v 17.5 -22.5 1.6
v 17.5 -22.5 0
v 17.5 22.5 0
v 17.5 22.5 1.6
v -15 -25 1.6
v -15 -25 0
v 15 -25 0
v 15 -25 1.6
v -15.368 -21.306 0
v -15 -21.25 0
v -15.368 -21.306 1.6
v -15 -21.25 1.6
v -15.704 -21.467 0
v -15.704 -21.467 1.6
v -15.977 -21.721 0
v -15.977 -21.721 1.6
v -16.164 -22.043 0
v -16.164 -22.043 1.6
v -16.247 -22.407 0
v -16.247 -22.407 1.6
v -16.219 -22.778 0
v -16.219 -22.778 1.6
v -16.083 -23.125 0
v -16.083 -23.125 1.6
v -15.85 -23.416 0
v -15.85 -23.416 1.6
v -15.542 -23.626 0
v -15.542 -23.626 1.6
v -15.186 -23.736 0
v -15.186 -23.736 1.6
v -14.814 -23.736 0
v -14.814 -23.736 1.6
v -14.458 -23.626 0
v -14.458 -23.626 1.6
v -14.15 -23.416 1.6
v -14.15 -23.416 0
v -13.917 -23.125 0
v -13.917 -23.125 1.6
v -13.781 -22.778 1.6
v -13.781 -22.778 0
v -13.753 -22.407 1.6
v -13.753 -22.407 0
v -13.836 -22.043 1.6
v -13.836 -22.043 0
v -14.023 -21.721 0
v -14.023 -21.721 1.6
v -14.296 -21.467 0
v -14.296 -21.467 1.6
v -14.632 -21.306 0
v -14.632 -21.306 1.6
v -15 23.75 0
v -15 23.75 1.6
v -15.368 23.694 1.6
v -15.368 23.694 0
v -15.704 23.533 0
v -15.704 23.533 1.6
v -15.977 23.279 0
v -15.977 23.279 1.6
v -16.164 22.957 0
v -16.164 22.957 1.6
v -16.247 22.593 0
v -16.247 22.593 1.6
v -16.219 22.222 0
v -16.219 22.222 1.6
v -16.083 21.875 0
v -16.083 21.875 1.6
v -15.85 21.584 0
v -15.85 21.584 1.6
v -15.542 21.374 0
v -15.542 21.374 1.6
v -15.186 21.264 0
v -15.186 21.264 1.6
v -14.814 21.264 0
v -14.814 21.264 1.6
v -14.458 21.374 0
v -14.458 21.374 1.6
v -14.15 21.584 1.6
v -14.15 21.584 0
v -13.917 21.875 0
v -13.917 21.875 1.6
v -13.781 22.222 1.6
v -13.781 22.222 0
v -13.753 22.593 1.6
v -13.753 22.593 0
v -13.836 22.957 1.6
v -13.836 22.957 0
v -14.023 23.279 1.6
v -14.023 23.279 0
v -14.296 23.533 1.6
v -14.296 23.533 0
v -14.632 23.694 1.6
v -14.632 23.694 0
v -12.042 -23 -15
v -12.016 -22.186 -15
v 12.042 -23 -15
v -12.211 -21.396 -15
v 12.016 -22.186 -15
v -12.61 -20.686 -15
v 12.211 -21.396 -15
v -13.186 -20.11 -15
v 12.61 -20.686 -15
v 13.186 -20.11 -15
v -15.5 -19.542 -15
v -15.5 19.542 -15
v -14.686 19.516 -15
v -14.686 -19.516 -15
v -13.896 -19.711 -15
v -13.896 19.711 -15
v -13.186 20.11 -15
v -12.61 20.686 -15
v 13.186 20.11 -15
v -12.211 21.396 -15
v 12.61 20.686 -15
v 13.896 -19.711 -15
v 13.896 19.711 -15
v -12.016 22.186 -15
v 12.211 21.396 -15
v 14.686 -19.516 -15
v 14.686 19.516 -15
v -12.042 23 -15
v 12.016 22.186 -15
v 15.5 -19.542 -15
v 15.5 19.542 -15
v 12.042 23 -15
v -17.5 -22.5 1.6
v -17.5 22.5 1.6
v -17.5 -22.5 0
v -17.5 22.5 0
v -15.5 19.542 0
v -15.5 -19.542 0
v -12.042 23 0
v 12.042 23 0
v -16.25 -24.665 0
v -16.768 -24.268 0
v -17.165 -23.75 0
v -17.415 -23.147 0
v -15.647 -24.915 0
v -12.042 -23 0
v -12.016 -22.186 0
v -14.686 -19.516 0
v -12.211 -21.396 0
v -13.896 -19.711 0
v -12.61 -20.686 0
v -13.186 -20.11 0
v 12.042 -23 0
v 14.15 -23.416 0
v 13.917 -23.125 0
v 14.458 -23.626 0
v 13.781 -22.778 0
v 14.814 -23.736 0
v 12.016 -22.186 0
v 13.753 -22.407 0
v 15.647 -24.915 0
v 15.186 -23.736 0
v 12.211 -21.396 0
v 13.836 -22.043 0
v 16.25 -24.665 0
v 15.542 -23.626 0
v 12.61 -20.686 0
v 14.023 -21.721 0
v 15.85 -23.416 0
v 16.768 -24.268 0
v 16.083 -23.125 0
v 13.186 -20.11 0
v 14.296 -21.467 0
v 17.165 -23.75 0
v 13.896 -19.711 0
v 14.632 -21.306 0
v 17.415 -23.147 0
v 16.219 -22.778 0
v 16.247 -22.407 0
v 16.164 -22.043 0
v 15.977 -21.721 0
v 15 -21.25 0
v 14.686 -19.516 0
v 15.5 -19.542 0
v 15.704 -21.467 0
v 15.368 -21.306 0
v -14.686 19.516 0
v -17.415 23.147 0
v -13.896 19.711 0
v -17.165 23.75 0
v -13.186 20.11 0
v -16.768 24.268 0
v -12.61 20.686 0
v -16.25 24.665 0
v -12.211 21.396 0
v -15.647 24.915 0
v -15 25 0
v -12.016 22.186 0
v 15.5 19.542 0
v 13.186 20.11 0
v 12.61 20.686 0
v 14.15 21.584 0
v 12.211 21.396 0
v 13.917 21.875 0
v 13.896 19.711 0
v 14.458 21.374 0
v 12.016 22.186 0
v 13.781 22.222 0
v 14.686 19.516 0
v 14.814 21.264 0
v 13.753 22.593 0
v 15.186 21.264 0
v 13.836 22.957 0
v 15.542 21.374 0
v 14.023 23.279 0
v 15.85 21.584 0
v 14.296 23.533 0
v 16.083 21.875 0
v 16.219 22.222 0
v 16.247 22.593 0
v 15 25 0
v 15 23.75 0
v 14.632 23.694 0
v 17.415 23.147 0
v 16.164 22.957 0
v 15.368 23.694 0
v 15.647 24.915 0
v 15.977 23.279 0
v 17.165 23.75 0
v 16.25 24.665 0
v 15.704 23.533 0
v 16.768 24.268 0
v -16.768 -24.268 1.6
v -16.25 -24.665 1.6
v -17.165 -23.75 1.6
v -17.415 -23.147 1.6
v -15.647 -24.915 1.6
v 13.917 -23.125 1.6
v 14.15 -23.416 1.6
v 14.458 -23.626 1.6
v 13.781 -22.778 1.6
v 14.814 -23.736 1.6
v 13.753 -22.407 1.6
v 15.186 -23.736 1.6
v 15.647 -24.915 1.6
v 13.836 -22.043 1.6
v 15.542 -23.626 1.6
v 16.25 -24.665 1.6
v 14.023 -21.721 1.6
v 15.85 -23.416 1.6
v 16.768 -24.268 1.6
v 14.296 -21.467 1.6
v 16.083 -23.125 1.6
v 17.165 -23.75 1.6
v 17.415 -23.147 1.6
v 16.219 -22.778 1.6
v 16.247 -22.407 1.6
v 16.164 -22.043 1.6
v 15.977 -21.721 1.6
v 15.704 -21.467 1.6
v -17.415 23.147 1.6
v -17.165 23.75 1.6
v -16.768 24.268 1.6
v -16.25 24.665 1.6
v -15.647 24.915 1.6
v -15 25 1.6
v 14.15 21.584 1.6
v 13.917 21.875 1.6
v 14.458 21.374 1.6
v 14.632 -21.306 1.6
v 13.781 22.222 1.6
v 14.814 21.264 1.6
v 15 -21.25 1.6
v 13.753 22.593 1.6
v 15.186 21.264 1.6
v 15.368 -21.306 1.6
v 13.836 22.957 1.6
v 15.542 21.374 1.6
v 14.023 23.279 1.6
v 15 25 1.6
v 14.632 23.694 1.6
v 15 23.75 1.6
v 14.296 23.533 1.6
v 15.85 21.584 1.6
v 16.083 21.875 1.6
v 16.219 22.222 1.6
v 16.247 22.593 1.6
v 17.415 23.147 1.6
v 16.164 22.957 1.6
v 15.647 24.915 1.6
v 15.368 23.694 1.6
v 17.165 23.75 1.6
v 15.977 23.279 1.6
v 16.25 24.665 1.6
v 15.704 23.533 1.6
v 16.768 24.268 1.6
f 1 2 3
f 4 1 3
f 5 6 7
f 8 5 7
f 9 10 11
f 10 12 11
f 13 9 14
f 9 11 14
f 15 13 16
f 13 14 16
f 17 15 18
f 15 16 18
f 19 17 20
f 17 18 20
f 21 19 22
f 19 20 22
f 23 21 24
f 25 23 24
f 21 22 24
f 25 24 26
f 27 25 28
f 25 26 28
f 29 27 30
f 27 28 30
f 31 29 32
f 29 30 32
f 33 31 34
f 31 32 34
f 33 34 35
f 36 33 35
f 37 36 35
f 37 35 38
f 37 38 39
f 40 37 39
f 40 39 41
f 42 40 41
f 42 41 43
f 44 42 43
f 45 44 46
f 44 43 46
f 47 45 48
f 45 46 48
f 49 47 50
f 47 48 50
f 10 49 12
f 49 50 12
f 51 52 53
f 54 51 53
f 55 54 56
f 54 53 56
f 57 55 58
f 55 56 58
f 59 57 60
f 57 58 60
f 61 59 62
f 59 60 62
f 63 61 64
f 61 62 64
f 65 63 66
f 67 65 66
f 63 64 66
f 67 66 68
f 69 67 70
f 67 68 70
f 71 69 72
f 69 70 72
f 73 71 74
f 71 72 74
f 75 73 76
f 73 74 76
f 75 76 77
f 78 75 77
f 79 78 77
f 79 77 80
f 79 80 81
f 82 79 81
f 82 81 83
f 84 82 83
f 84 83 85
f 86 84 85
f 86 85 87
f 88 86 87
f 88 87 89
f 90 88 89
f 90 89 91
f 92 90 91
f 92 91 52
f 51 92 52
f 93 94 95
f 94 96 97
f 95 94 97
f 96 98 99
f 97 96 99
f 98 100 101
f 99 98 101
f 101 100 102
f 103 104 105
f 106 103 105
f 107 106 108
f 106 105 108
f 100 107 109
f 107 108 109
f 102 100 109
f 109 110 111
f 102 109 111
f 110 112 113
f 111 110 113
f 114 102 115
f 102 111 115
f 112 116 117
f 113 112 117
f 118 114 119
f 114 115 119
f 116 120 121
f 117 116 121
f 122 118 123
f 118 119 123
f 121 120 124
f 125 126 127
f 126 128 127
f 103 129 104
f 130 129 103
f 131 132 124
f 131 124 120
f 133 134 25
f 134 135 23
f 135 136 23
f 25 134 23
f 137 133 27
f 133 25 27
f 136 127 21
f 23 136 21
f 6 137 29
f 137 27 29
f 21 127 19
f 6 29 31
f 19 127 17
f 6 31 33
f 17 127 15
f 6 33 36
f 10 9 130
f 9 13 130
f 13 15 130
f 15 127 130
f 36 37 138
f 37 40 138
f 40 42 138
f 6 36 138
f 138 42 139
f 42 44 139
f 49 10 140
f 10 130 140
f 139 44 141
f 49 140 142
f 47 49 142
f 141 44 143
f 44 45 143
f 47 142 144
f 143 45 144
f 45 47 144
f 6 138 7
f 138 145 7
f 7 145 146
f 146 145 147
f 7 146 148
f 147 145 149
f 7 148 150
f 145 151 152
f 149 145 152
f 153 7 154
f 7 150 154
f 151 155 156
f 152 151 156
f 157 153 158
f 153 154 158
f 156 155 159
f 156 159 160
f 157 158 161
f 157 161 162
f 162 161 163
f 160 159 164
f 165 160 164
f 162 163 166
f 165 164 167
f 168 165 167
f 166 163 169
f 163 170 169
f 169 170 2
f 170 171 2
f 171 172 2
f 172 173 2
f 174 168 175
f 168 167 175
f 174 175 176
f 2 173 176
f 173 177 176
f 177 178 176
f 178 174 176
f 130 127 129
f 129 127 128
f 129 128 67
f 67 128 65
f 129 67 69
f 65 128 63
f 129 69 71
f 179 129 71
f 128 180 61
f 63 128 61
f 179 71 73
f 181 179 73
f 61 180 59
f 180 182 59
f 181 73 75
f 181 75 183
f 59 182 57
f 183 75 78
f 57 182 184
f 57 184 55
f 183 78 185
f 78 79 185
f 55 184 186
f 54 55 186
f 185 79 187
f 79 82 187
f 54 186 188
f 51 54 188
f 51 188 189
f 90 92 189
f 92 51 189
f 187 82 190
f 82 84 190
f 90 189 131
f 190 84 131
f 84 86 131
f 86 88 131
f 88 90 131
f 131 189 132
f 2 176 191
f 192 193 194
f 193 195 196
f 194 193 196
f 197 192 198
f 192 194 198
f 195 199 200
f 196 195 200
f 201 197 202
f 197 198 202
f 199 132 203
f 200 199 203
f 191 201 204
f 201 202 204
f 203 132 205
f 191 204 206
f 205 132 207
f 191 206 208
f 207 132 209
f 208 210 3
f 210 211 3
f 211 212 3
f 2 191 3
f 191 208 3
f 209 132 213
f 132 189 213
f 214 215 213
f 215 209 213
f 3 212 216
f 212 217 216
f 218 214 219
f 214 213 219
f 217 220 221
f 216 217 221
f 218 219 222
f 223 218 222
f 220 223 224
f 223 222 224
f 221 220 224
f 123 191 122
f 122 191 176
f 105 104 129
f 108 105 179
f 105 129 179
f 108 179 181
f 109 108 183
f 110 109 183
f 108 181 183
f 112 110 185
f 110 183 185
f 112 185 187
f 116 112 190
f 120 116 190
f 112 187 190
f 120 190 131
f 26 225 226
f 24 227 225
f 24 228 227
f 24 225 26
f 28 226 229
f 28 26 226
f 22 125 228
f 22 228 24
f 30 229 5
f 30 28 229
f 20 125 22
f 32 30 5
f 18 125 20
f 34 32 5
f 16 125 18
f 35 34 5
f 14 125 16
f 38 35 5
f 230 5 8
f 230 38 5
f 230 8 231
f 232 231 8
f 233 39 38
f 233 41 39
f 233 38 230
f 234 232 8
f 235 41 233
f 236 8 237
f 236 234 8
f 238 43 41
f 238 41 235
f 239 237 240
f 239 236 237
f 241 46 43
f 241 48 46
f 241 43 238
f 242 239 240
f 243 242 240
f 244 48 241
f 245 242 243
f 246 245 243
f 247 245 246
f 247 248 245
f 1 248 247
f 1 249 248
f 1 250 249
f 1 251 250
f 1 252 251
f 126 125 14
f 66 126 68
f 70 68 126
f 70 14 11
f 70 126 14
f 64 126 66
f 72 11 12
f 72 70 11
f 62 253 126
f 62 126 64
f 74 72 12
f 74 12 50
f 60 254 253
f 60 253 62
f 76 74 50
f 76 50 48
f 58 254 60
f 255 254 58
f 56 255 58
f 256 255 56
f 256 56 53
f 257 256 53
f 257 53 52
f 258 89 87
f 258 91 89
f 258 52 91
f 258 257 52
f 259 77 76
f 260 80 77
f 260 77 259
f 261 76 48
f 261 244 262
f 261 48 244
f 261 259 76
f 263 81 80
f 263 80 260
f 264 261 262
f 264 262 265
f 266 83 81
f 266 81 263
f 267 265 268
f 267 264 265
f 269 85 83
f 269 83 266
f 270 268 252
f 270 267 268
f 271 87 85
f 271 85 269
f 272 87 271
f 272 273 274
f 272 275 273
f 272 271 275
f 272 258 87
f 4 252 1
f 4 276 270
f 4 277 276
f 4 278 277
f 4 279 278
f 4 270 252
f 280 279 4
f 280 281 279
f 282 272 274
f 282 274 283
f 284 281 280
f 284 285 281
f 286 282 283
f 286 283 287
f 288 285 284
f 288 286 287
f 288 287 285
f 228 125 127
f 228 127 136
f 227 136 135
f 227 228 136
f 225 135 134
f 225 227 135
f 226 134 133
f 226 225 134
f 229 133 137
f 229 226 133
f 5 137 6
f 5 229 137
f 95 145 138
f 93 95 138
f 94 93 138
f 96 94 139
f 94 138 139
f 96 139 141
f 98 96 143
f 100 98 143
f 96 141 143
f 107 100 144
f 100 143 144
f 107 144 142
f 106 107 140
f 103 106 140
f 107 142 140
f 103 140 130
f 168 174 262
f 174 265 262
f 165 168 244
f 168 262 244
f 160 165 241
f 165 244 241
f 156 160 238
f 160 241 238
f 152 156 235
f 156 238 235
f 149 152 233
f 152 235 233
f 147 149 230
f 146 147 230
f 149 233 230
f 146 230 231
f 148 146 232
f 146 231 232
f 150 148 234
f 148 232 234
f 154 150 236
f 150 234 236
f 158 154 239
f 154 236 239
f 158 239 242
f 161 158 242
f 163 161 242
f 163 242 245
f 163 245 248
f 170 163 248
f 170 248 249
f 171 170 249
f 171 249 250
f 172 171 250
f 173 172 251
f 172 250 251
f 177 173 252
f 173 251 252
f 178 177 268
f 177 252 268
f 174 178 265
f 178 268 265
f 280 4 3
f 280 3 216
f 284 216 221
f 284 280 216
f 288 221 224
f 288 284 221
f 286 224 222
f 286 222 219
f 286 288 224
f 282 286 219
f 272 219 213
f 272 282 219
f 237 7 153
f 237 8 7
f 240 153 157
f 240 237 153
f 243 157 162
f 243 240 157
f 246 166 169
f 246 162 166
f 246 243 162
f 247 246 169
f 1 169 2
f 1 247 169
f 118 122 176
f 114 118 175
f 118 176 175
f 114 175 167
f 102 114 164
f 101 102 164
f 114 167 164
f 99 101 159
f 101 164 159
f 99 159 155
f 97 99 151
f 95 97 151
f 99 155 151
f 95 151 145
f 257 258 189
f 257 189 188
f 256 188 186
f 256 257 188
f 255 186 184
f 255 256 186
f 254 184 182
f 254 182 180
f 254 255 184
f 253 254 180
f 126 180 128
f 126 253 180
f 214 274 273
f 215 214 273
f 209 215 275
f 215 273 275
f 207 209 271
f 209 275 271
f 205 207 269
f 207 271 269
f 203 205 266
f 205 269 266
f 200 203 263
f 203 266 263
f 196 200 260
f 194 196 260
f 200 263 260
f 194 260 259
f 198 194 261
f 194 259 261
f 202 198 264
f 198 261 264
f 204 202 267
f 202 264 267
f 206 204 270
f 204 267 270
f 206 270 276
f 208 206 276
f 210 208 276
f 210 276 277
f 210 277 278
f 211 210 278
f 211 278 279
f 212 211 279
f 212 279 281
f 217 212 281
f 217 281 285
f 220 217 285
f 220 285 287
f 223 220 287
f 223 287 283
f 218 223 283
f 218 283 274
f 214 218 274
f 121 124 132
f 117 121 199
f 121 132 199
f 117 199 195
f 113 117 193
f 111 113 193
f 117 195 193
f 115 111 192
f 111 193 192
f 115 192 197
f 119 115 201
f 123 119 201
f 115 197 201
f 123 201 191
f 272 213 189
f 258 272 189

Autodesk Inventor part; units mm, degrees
ref_plane "YZ Plane" through (0, 0, 0) normal (1, 0, 0) x (0, 1, 0)
ref_plane "XZ Plane" through (0, 0, 0) normal (0, 1, 0) x (-1, 0, 0)
ref_plane "XY Plane" through (0, 0, 0) normal (0, 0, 1) x (1, 0, 0)
sketch "Sketch1" plane through (0, 0, 0) normal (0, 0, 1) x (1, 0, 0)
  line L0 (17.5, 25) -> (-17.5, 25)
  line L1 (-17.5, 25) -> (-17.5, -25)
  line L2 (-17.5, -25) -> (17.5, -25)
  line L3 (17.5, -25) -> (17.5, 25)
  line L4 (17.5, 25) -> (-17.5, -25) construction
  line L5 (-17.5, 25) -> (17.5, -25) construction
  line L6 (-14, -18) -> (14, -18) construction
  line L7 (14, -18) -> (14, 18) construction
  line L8 (14, 18) -> (-14, 18) construction
  line L9 (-14, 18) -> (-14, -18) construction
  line L10 (-14, -18) -> (14, 18) construction
  line L11 (14, -18) -> (-14, 18) construction
  circle A0 centre (14, 18) radius 2.4 construction
  arc A1 (13.2801, 15.7105) -> (14.7199, 15.7105) centre (14, 15.5) ccw construction
  arc A2 (14.7199, 20.2895) -> (13.2801, 20.2895) centre (14, 20.5) ccw construction
  line L12 (0, 25) -> (0, -25) construction
  line L13 (17.5, 0) -> (-17.5, 0) construction
  line L14 (0, -25) -> (0, 25) construction
  line L15 (-15, -22.5) -> (15, -22.5) construction
  line L16 (15, -22.5) -> (15, 22.5) construction
  line L17 (15, 22.5) -> (-15, 22.5) construction
  line L18 (-15, 22.5) -> (-15, -22.5) construction
  line L19 (-15, -22.5) -> (15, 22.5) construction
  line L20 (15, -22.5) -> (-15, 22.5) construction
  circle A3 centre (15, 22.5) radius 2.5 construction
  arc A4 (12.042, 23) -> (15.5, 19.542) centre (15, 22.5) ccw
  line L21 (15.5, 19.542) -> (15.5, -19.542)
  line L22 (12.042, 23) -> (-12.042, 23)
  arc A5 (-15.5, 19.542) -> (-12.042, 23) centre (-15, 22.5) ccw
  line L23 (-15.5, 19.542) -> (-15.5, -19.542)
  arc A6 (15.5, -19.542) -> (12.042, -23) centre (15, -22.5) ccw
  line L24 (12.042, -23) -> (-12.042, -23)
  arc A7 (-12.042, -23) -> (-15.5, -19.542) centre (-15, -22.5) ccw
  point P0 (0, 0)
  point P1 (14, 14.75)
  point P2 (14, 21.25)
  point P3 (13.2801, 20.2895)
  point P4 (14.7199, 20.2895)
  dimension "d0" = 35
  dimension "d1" = 50
  dimension "d2" = 4.8
  dimension "d3" = 6.5
  dimension "d4" = 1.5
  dimension "d5" = 7
  dimension "d6" = 14
  dimension "d9" = 5
  dimension "d18" = 3
  dimension "d19" = 2
  dimension "d20" = 2
extrude "Extrusion1" add sketch "Sketch1" along normal blind 1.6 contours L3 L2 L1 L0 | A4 L21 A6 L24 A7 L23 A5 L22
hole "Hole1" at (-15, -22.5, 0) at (-15, 22.5, 0) at (15, 22.5, 0) at (15, -22.5, 0) direction (0, 0, 1) diameter 2.5 end through all
fillet "Fillet1" radius 2.5 4 edges at (17.5, -25, 0.8) (-17.5, -25, 0.8) (-17.5, 25, 0.8) (17.5, 25, 0.8)
extrude "Extrusion2" add sketch "Sketch1" against normal blind 15 contours A4 L21 A6 L24 A7 L23 A5 L22
equation "\"d20\" = d19"
properties part number "SUSTAINA-USB-AUDIO-BOARD" material "CFRP"
